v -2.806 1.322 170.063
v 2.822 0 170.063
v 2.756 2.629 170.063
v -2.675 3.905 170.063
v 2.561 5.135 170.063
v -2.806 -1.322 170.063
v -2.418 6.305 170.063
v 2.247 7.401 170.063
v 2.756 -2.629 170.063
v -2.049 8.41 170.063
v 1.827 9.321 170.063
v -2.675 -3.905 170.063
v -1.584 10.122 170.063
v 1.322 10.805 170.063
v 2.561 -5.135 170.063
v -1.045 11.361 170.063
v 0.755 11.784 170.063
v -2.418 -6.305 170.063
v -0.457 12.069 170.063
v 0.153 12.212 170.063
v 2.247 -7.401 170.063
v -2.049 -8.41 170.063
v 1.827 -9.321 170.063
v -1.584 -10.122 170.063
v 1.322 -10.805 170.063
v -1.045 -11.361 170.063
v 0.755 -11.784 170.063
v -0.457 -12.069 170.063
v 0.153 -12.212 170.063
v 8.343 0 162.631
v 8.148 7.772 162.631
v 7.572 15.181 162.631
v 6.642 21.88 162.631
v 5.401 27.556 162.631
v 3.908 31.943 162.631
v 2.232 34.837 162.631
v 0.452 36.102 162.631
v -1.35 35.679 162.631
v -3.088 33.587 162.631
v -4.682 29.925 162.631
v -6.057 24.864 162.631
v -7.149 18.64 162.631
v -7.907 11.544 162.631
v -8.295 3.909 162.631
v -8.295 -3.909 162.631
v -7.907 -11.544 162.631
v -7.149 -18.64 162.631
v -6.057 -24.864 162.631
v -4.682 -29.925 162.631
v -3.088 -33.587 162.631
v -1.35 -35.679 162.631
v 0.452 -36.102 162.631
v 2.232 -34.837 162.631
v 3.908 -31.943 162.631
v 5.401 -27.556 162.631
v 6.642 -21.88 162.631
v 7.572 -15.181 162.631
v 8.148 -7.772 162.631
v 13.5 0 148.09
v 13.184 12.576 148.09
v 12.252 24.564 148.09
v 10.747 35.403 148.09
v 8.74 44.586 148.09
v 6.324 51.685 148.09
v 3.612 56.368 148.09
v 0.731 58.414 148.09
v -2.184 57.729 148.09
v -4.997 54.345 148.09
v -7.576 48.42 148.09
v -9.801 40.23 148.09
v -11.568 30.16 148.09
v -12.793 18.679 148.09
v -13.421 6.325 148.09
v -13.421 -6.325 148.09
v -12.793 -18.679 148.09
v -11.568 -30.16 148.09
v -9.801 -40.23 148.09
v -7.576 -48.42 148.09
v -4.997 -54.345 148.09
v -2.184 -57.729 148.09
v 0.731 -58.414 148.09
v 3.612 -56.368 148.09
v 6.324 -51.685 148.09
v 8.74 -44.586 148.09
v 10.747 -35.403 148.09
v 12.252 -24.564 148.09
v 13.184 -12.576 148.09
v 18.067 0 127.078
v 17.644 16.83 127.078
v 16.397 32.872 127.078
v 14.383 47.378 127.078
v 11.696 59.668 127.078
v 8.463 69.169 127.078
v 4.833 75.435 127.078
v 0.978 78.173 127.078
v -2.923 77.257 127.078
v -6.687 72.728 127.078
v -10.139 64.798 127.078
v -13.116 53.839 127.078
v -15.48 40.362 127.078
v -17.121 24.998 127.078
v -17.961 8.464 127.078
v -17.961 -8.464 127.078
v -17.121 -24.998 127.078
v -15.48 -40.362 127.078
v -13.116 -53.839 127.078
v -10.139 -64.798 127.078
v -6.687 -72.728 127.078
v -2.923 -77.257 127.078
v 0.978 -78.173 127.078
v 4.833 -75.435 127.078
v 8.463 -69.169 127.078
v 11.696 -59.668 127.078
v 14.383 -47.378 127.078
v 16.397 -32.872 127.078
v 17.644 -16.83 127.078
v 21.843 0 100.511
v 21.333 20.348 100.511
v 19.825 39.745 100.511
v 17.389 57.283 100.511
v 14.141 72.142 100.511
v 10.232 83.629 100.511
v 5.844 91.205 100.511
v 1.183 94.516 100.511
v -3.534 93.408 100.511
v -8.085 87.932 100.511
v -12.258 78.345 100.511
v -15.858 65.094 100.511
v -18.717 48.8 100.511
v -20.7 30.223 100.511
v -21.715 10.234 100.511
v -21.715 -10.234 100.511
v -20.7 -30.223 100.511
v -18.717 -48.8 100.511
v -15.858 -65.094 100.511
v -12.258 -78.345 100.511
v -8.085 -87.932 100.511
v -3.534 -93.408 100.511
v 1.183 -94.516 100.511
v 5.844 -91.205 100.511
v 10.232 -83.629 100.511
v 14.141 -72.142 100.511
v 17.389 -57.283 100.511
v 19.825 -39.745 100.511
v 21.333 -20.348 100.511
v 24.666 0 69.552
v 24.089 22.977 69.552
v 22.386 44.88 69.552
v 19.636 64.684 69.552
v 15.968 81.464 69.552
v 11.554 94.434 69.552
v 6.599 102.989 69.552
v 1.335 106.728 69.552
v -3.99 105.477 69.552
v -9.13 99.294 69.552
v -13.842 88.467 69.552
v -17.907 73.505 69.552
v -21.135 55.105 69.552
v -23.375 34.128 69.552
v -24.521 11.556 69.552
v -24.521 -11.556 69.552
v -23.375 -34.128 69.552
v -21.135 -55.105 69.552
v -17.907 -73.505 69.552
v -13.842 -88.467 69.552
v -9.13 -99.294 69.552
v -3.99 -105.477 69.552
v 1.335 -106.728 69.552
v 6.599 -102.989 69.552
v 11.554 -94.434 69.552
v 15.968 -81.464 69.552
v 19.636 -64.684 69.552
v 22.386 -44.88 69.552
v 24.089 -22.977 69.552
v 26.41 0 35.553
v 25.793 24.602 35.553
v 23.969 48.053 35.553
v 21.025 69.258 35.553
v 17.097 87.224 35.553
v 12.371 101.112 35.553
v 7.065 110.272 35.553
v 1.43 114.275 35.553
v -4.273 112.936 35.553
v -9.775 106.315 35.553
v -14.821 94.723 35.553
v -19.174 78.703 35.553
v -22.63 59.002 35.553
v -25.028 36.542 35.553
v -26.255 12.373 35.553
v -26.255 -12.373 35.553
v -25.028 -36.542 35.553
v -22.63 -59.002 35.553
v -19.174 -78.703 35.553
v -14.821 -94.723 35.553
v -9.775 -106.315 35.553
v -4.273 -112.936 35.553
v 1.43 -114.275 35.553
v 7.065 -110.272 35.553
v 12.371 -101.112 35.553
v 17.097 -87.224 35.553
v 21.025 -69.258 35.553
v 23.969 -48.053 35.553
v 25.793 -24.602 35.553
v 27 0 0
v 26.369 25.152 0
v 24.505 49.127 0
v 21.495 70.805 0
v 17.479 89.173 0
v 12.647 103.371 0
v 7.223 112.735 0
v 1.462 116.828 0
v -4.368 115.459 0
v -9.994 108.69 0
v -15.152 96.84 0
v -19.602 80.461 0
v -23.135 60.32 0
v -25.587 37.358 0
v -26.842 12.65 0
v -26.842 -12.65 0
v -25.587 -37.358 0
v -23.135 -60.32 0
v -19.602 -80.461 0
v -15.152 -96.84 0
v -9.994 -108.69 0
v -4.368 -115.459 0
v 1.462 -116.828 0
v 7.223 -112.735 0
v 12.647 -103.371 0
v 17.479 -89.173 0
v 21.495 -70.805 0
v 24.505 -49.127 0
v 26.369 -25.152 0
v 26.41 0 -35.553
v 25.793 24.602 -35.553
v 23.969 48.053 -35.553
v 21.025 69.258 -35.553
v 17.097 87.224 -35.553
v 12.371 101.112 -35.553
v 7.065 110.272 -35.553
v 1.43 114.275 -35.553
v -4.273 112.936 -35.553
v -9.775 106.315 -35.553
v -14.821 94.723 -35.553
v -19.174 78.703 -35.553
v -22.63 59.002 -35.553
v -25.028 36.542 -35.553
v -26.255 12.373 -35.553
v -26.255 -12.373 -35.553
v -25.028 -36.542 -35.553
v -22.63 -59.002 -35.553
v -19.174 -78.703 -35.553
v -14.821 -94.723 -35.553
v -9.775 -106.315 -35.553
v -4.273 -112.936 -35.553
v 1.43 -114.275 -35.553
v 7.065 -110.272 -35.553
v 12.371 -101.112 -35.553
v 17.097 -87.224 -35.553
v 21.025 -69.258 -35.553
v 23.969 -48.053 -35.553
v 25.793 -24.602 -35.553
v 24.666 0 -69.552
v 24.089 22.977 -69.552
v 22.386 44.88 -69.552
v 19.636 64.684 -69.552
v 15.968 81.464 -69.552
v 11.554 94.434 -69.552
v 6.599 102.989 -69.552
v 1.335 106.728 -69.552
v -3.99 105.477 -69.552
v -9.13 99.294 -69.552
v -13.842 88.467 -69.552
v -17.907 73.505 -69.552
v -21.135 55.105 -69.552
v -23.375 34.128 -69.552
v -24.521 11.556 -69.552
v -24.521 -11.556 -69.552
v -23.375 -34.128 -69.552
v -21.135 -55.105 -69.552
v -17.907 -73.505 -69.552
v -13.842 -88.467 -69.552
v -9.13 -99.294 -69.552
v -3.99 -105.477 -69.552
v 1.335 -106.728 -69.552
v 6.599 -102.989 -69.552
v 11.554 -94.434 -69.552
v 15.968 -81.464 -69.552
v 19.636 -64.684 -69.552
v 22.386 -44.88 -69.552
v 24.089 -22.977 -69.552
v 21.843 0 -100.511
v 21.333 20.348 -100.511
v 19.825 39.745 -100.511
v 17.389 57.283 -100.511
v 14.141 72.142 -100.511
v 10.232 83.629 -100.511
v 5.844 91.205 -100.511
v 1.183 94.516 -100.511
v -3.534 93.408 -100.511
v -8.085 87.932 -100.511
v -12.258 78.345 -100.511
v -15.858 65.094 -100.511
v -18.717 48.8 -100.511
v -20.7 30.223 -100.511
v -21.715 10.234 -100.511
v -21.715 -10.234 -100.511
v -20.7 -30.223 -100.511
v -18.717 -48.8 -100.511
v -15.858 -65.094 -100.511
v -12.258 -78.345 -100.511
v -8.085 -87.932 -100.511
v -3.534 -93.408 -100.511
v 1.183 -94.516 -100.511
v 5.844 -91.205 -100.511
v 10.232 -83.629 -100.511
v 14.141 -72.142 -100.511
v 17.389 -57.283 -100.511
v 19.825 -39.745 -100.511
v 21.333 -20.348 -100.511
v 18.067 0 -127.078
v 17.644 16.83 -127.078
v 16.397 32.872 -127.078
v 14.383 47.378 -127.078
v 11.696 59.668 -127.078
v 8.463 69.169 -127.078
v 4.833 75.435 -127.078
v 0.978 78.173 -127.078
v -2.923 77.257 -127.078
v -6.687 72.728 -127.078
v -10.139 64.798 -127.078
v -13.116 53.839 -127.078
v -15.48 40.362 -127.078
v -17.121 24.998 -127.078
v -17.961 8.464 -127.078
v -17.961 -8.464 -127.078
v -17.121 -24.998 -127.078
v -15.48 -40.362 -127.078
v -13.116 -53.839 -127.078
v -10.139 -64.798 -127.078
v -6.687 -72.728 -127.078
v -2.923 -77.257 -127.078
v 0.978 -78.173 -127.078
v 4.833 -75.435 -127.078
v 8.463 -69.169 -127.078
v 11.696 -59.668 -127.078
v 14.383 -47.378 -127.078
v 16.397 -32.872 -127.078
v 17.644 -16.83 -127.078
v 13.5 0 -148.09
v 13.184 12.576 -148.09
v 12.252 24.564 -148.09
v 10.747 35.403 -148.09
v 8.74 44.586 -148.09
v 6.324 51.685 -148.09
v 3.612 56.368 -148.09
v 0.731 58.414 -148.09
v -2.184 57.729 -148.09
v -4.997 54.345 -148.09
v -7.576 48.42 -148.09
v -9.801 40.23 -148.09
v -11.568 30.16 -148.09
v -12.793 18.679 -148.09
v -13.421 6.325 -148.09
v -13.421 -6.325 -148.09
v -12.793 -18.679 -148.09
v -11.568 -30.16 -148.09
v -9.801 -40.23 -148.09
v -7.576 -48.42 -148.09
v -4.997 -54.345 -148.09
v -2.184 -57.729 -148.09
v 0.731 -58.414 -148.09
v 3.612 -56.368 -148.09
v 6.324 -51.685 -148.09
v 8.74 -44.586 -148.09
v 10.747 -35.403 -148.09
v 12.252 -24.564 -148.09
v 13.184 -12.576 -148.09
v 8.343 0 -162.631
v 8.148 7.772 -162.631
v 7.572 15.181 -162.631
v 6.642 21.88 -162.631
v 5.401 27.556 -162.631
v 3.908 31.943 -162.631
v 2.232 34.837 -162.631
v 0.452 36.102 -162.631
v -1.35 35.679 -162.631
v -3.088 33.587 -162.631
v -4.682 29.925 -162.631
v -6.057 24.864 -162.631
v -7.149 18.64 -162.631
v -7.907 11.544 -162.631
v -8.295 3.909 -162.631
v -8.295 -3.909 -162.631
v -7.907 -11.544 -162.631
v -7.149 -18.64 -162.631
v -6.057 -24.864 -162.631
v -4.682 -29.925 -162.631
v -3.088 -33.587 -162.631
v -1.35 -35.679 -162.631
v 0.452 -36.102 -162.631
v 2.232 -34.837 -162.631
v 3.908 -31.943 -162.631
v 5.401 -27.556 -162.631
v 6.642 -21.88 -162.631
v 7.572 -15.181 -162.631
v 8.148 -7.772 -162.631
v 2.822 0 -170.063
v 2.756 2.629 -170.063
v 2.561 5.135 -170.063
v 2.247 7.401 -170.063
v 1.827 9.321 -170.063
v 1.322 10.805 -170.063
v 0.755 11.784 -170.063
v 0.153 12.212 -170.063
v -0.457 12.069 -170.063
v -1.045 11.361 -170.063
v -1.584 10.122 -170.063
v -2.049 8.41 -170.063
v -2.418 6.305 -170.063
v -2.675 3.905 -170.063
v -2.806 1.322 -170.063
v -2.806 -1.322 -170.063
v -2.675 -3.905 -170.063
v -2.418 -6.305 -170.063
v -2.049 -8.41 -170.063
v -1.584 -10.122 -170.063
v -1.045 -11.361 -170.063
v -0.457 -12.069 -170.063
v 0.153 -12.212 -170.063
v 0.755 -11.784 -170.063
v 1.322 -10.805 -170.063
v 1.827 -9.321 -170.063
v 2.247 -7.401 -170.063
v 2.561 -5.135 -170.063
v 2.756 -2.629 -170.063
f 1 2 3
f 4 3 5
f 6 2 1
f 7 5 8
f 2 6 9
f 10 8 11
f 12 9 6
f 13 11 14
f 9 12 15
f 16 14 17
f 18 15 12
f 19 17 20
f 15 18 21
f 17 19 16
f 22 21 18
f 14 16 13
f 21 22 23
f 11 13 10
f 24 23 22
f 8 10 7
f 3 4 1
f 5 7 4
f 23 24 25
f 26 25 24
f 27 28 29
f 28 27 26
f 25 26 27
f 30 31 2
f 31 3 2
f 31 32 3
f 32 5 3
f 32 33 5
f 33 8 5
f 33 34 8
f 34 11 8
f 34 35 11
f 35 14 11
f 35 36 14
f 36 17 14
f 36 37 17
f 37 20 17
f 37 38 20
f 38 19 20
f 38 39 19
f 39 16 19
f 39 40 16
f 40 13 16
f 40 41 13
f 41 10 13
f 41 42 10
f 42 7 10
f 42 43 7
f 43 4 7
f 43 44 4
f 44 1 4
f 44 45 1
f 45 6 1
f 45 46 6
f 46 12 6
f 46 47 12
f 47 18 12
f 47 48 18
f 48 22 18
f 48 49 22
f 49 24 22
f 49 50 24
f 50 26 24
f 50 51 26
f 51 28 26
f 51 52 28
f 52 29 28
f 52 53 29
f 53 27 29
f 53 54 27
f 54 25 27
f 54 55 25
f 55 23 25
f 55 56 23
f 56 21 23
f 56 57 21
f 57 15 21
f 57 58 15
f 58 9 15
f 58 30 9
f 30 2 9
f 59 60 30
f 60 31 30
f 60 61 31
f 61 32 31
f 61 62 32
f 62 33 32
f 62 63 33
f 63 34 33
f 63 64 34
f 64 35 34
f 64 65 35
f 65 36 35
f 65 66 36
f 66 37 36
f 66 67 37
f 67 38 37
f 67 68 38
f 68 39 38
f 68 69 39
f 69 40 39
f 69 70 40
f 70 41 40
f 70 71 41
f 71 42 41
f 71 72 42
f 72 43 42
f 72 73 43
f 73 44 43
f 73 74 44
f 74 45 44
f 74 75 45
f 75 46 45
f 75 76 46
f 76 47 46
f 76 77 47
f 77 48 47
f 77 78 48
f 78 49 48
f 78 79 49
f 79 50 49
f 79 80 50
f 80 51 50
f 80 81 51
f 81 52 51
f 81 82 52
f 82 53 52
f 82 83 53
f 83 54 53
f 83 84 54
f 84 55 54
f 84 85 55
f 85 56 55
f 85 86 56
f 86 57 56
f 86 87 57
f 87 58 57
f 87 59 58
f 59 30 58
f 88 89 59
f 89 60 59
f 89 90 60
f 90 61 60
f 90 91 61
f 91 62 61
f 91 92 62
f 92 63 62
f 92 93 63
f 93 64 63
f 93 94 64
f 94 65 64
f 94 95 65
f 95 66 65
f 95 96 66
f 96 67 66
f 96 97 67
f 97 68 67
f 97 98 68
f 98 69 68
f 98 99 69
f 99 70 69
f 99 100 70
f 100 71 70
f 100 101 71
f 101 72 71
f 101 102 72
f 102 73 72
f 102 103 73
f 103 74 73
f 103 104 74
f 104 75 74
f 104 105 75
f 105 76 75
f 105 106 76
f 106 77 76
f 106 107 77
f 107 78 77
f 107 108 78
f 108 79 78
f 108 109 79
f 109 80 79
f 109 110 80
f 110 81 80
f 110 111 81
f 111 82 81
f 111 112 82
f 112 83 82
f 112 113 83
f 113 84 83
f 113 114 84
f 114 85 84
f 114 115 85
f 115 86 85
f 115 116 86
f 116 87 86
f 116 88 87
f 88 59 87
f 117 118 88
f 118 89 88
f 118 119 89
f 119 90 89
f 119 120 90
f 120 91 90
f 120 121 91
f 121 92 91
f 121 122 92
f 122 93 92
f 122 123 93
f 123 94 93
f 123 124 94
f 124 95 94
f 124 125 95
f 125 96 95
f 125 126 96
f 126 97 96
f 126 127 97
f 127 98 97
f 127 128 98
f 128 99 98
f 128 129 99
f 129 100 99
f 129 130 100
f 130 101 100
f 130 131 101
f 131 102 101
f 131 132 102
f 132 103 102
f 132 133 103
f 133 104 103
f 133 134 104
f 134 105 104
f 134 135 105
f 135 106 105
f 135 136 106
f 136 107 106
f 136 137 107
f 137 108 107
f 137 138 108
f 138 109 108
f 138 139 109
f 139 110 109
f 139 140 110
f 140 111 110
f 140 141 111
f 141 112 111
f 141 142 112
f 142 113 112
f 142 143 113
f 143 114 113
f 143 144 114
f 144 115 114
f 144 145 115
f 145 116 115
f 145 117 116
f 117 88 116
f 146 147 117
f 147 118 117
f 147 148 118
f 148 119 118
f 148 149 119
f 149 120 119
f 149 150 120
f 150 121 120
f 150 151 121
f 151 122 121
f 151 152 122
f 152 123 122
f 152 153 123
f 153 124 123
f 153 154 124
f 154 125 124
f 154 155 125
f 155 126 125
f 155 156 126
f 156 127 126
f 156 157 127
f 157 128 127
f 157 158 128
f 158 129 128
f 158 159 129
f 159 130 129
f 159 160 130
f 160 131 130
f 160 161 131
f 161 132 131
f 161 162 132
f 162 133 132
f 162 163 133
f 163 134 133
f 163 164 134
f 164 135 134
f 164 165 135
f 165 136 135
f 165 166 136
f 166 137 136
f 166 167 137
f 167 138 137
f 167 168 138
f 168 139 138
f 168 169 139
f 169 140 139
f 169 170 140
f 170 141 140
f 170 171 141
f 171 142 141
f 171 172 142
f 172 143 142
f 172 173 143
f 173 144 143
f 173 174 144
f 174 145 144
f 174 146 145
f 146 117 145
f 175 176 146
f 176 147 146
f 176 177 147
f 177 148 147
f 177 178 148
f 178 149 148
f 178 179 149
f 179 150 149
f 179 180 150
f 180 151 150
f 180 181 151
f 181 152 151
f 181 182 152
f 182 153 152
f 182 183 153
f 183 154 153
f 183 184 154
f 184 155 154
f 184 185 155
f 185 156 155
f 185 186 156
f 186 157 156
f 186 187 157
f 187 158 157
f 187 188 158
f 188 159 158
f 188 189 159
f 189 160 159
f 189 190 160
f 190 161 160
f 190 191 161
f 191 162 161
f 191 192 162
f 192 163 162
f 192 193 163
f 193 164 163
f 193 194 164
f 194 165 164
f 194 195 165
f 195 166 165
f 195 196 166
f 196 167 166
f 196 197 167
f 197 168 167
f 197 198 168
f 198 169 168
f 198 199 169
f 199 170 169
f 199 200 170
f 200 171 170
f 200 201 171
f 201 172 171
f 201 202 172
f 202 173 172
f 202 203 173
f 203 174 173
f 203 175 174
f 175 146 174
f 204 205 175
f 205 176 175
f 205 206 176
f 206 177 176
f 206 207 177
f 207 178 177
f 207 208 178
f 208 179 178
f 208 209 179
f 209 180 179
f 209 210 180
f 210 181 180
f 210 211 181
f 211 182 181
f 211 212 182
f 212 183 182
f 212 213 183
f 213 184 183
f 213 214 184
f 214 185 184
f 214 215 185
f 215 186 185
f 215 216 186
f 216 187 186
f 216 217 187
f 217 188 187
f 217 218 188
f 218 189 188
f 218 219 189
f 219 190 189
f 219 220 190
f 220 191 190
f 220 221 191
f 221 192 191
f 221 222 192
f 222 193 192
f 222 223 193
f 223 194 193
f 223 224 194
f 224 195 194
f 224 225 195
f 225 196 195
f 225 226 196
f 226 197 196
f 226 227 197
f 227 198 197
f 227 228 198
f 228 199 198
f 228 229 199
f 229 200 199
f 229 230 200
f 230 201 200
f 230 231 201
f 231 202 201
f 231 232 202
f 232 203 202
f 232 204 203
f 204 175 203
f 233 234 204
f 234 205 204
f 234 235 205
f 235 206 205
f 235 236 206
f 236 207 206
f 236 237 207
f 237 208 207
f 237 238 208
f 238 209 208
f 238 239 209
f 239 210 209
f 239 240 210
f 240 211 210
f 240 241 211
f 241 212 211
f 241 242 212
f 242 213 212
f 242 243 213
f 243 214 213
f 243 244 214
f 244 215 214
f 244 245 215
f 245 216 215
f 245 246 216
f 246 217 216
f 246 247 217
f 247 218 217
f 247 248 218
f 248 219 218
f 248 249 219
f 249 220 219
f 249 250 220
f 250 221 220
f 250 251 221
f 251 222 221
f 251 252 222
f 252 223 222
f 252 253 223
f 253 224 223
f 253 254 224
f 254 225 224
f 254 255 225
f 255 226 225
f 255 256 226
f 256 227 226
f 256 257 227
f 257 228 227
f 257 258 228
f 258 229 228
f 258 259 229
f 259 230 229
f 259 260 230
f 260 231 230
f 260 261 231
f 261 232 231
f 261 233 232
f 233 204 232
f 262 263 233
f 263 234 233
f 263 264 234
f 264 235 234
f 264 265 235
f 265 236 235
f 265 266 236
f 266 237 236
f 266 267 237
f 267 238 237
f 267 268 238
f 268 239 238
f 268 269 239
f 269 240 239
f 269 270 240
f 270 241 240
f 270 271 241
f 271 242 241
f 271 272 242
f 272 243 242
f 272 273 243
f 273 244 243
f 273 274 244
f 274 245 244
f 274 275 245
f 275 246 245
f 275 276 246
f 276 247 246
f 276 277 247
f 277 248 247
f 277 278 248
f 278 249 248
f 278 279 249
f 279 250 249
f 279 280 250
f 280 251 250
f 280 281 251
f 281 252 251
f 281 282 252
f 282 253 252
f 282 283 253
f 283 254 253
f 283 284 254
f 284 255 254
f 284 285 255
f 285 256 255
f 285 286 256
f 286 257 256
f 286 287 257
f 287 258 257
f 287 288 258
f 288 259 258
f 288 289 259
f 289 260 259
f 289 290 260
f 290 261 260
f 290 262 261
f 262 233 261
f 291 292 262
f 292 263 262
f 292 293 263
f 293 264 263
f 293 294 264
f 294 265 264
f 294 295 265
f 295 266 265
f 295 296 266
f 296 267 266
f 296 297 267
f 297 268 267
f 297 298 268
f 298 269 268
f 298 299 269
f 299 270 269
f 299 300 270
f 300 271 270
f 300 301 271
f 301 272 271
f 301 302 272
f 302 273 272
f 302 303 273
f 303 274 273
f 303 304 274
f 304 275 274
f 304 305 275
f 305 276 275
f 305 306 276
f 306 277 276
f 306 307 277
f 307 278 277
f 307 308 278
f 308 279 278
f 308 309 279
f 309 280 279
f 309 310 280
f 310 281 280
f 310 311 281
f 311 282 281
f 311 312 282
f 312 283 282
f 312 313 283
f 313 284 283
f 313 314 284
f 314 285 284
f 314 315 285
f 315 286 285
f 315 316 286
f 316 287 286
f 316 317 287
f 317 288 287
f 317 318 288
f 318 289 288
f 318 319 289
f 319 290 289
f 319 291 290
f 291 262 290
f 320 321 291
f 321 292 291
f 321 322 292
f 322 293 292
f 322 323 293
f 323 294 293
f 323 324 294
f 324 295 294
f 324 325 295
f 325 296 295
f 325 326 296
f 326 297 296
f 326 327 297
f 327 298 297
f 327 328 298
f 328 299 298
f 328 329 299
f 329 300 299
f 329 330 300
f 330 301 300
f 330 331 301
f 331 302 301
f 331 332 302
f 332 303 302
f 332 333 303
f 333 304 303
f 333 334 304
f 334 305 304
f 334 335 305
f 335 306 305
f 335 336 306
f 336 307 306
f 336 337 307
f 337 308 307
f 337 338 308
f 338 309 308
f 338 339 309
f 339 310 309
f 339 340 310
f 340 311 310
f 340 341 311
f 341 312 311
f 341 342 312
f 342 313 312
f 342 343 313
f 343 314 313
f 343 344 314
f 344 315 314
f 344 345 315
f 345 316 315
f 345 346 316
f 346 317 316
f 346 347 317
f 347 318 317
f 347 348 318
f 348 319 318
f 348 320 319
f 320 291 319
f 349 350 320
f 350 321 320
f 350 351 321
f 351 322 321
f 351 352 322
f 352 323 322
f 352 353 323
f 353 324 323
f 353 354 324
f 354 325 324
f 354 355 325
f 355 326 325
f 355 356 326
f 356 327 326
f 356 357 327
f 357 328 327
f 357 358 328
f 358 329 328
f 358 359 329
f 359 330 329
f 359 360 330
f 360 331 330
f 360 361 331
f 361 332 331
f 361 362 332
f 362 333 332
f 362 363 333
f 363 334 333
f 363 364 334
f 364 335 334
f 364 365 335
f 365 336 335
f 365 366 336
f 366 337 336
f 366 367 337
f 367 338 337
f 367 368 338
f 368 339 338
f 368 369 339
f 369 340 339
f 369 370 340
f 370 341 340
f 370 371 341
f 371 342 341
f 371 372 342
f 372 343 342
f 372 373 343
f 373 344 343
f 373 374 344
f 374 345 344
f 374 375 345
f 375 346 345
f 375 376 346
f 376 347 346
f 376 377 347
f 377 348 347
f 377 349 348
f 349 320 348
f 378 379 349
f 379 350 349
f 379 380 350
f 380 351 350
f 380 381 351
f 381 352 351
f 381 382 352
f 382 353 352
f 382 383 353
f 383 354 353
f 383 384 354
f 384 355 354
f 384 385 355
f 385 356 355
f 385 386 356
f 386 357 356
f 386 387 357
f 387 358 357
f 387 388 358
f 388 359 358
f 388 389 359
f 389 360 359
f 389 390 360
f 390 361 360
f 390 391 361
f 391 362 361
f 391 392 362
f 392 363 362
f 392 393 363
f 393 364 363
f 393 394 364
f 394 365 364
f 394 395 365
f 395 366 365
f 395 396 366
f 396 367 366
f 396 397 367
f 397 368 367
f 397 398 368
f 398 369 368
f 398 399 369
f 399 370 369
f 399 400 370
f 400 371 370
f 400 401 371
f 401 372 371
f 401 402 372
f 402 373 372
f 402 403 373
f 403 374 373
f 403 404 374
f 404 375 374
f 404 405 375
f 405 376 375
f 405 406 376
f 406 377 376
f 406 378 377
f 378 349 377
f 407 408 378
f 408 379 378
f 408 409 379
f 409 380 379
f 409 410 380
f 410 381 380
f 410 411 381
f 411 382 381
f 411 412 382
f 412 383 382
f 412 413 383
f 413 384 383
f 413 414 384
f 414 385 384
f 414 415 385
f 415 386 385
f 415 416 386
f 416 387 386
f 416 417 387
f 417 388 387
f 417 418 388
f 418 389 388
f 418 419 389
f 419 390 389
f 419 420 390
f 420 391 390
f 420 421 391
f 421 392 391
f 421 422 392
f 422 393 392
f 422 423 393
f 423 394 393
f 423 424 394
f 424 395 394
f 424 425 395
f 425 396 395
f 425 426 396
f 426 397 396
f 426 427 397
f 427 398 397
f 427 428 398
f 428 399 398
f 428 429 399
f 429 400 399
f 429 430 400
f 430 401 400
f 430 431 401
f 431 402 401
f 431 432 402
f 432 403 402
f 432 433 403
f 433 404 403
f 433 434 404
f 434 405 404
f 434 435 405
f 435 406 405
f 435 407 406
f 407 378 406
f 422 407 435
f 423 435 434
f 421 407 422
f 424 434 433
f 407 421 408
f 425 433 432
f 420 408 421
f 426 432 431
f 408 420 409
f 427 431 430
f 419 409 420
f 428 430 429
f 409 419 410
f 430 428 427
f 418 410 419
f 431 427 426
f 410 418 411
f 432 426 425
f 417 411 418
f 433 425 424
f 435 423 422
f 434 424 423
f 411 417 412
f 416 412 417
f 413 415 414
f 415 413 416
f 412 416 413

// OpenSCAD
// Generated by SolidPython 1.0.1 on 2020-07-29 00:46:45


scale(v = [3, 13, 19]) {
	sphere(r = 9);
}
/***********************************************
*********      SolidPython code:      **********
************************************************
 
# import packages: SolidPython
from solid import *
from solid.utils import *
from itertools import chain, combinations, permutations


class Resize:

    def __init__(self, scad_file):
        self.scad_file = scad_file
        #self.scad_file = import_scad(scad_file)
        # cone/cylinder param:
        self.r1 = 0
        self.r2 = 0
        self.h = 0
        # rectangular prism param:
        self.w = 0
        self.l = 0
        # ellipse param:
        self.r = 0

    # import OpenScad code (file name corresponds to shape)


    # classify shape + parameters
    def assign(self, param1, param2, param3):
        if self.scad_file == 'cone.scad':
            self.r1 = param1
            self.r2 = param2
            self.h = param3
        elif self.scad_file == 'cylinder.scad':
            self.r1 = param1
            self.r2 = param2
            self.h = param3
        elif self.scad_file == 'rectangularPrism.scad':
            self.h = param1
            self.l = param2
            self.w = param3
        else:
            self.r = param1
            self.h = param2

    # resize parameters
    def iterate(self):
        x = range(3, 20, 2)
        i = 1
        if self.scad_file == 'cone.scad':
            tempList = list(permutations(x, 2))
            for temp in tempList:
                param1 = temp[0]
                param2 = temp[1]
                filepath = 'produced_scad_files/' + 'cone' + str(param1) + '_' + str(param2) + '_' + '.scad'
                scad_render_to_file(cylinder(h=param1, r1=param2, r2=0), filepath)

        elif self.scad_file == 'cylinder.scad':
            tempList = list(permutations(x, 3))
            for temp in tempList:
                param1 = temp[0]
                param2 = temp[1]
                filepath = 'produced_scad_files/' + 'cylinder' + str(param1) + '_' + str(param2) + '_' + '.scad'
                scad_render_to_file(cylinder(h=param1, r1=param2, r2=param2), filepath)

        elif self.scad_file == 'rectangularPrism.scad':
            tempList = list(permutations(x, 3))
            for temp in tempList:
                param1 = temp[0]
                param2 = temp[1]
                param3 = temp[2]
                filepath = 'produced_scad_files/' + 'rectangularPrism' + str(param1) + '_' + str(param2) + '_' + str(
                    param3) + '.scad'
                scad_render_to_file(cube(size=(param1, param2, param3)), filepath)

        elif self.scad_file == 'ellipse.scad':
            tempList = list(permutations(x, 4))
            for temp in tempList:
                param1 = temp[0]
                param2 = temp[1]
                param3 = temp[2]
                param4 = temp[3]
                filepath = 'produced_scad_files/' + 'ellipse' + str(param1) + '_' + str(param2) + '_' + str(param3) + '_' + str(param4) + '.scad'
                scad_render_to_file(scale([param1, param2, param3])(sphere(r=param4)), filepath)

    def render_to_scadfile(self):
        scad_render_to_file(scad, 'example.scad') 
 
************************************************/
